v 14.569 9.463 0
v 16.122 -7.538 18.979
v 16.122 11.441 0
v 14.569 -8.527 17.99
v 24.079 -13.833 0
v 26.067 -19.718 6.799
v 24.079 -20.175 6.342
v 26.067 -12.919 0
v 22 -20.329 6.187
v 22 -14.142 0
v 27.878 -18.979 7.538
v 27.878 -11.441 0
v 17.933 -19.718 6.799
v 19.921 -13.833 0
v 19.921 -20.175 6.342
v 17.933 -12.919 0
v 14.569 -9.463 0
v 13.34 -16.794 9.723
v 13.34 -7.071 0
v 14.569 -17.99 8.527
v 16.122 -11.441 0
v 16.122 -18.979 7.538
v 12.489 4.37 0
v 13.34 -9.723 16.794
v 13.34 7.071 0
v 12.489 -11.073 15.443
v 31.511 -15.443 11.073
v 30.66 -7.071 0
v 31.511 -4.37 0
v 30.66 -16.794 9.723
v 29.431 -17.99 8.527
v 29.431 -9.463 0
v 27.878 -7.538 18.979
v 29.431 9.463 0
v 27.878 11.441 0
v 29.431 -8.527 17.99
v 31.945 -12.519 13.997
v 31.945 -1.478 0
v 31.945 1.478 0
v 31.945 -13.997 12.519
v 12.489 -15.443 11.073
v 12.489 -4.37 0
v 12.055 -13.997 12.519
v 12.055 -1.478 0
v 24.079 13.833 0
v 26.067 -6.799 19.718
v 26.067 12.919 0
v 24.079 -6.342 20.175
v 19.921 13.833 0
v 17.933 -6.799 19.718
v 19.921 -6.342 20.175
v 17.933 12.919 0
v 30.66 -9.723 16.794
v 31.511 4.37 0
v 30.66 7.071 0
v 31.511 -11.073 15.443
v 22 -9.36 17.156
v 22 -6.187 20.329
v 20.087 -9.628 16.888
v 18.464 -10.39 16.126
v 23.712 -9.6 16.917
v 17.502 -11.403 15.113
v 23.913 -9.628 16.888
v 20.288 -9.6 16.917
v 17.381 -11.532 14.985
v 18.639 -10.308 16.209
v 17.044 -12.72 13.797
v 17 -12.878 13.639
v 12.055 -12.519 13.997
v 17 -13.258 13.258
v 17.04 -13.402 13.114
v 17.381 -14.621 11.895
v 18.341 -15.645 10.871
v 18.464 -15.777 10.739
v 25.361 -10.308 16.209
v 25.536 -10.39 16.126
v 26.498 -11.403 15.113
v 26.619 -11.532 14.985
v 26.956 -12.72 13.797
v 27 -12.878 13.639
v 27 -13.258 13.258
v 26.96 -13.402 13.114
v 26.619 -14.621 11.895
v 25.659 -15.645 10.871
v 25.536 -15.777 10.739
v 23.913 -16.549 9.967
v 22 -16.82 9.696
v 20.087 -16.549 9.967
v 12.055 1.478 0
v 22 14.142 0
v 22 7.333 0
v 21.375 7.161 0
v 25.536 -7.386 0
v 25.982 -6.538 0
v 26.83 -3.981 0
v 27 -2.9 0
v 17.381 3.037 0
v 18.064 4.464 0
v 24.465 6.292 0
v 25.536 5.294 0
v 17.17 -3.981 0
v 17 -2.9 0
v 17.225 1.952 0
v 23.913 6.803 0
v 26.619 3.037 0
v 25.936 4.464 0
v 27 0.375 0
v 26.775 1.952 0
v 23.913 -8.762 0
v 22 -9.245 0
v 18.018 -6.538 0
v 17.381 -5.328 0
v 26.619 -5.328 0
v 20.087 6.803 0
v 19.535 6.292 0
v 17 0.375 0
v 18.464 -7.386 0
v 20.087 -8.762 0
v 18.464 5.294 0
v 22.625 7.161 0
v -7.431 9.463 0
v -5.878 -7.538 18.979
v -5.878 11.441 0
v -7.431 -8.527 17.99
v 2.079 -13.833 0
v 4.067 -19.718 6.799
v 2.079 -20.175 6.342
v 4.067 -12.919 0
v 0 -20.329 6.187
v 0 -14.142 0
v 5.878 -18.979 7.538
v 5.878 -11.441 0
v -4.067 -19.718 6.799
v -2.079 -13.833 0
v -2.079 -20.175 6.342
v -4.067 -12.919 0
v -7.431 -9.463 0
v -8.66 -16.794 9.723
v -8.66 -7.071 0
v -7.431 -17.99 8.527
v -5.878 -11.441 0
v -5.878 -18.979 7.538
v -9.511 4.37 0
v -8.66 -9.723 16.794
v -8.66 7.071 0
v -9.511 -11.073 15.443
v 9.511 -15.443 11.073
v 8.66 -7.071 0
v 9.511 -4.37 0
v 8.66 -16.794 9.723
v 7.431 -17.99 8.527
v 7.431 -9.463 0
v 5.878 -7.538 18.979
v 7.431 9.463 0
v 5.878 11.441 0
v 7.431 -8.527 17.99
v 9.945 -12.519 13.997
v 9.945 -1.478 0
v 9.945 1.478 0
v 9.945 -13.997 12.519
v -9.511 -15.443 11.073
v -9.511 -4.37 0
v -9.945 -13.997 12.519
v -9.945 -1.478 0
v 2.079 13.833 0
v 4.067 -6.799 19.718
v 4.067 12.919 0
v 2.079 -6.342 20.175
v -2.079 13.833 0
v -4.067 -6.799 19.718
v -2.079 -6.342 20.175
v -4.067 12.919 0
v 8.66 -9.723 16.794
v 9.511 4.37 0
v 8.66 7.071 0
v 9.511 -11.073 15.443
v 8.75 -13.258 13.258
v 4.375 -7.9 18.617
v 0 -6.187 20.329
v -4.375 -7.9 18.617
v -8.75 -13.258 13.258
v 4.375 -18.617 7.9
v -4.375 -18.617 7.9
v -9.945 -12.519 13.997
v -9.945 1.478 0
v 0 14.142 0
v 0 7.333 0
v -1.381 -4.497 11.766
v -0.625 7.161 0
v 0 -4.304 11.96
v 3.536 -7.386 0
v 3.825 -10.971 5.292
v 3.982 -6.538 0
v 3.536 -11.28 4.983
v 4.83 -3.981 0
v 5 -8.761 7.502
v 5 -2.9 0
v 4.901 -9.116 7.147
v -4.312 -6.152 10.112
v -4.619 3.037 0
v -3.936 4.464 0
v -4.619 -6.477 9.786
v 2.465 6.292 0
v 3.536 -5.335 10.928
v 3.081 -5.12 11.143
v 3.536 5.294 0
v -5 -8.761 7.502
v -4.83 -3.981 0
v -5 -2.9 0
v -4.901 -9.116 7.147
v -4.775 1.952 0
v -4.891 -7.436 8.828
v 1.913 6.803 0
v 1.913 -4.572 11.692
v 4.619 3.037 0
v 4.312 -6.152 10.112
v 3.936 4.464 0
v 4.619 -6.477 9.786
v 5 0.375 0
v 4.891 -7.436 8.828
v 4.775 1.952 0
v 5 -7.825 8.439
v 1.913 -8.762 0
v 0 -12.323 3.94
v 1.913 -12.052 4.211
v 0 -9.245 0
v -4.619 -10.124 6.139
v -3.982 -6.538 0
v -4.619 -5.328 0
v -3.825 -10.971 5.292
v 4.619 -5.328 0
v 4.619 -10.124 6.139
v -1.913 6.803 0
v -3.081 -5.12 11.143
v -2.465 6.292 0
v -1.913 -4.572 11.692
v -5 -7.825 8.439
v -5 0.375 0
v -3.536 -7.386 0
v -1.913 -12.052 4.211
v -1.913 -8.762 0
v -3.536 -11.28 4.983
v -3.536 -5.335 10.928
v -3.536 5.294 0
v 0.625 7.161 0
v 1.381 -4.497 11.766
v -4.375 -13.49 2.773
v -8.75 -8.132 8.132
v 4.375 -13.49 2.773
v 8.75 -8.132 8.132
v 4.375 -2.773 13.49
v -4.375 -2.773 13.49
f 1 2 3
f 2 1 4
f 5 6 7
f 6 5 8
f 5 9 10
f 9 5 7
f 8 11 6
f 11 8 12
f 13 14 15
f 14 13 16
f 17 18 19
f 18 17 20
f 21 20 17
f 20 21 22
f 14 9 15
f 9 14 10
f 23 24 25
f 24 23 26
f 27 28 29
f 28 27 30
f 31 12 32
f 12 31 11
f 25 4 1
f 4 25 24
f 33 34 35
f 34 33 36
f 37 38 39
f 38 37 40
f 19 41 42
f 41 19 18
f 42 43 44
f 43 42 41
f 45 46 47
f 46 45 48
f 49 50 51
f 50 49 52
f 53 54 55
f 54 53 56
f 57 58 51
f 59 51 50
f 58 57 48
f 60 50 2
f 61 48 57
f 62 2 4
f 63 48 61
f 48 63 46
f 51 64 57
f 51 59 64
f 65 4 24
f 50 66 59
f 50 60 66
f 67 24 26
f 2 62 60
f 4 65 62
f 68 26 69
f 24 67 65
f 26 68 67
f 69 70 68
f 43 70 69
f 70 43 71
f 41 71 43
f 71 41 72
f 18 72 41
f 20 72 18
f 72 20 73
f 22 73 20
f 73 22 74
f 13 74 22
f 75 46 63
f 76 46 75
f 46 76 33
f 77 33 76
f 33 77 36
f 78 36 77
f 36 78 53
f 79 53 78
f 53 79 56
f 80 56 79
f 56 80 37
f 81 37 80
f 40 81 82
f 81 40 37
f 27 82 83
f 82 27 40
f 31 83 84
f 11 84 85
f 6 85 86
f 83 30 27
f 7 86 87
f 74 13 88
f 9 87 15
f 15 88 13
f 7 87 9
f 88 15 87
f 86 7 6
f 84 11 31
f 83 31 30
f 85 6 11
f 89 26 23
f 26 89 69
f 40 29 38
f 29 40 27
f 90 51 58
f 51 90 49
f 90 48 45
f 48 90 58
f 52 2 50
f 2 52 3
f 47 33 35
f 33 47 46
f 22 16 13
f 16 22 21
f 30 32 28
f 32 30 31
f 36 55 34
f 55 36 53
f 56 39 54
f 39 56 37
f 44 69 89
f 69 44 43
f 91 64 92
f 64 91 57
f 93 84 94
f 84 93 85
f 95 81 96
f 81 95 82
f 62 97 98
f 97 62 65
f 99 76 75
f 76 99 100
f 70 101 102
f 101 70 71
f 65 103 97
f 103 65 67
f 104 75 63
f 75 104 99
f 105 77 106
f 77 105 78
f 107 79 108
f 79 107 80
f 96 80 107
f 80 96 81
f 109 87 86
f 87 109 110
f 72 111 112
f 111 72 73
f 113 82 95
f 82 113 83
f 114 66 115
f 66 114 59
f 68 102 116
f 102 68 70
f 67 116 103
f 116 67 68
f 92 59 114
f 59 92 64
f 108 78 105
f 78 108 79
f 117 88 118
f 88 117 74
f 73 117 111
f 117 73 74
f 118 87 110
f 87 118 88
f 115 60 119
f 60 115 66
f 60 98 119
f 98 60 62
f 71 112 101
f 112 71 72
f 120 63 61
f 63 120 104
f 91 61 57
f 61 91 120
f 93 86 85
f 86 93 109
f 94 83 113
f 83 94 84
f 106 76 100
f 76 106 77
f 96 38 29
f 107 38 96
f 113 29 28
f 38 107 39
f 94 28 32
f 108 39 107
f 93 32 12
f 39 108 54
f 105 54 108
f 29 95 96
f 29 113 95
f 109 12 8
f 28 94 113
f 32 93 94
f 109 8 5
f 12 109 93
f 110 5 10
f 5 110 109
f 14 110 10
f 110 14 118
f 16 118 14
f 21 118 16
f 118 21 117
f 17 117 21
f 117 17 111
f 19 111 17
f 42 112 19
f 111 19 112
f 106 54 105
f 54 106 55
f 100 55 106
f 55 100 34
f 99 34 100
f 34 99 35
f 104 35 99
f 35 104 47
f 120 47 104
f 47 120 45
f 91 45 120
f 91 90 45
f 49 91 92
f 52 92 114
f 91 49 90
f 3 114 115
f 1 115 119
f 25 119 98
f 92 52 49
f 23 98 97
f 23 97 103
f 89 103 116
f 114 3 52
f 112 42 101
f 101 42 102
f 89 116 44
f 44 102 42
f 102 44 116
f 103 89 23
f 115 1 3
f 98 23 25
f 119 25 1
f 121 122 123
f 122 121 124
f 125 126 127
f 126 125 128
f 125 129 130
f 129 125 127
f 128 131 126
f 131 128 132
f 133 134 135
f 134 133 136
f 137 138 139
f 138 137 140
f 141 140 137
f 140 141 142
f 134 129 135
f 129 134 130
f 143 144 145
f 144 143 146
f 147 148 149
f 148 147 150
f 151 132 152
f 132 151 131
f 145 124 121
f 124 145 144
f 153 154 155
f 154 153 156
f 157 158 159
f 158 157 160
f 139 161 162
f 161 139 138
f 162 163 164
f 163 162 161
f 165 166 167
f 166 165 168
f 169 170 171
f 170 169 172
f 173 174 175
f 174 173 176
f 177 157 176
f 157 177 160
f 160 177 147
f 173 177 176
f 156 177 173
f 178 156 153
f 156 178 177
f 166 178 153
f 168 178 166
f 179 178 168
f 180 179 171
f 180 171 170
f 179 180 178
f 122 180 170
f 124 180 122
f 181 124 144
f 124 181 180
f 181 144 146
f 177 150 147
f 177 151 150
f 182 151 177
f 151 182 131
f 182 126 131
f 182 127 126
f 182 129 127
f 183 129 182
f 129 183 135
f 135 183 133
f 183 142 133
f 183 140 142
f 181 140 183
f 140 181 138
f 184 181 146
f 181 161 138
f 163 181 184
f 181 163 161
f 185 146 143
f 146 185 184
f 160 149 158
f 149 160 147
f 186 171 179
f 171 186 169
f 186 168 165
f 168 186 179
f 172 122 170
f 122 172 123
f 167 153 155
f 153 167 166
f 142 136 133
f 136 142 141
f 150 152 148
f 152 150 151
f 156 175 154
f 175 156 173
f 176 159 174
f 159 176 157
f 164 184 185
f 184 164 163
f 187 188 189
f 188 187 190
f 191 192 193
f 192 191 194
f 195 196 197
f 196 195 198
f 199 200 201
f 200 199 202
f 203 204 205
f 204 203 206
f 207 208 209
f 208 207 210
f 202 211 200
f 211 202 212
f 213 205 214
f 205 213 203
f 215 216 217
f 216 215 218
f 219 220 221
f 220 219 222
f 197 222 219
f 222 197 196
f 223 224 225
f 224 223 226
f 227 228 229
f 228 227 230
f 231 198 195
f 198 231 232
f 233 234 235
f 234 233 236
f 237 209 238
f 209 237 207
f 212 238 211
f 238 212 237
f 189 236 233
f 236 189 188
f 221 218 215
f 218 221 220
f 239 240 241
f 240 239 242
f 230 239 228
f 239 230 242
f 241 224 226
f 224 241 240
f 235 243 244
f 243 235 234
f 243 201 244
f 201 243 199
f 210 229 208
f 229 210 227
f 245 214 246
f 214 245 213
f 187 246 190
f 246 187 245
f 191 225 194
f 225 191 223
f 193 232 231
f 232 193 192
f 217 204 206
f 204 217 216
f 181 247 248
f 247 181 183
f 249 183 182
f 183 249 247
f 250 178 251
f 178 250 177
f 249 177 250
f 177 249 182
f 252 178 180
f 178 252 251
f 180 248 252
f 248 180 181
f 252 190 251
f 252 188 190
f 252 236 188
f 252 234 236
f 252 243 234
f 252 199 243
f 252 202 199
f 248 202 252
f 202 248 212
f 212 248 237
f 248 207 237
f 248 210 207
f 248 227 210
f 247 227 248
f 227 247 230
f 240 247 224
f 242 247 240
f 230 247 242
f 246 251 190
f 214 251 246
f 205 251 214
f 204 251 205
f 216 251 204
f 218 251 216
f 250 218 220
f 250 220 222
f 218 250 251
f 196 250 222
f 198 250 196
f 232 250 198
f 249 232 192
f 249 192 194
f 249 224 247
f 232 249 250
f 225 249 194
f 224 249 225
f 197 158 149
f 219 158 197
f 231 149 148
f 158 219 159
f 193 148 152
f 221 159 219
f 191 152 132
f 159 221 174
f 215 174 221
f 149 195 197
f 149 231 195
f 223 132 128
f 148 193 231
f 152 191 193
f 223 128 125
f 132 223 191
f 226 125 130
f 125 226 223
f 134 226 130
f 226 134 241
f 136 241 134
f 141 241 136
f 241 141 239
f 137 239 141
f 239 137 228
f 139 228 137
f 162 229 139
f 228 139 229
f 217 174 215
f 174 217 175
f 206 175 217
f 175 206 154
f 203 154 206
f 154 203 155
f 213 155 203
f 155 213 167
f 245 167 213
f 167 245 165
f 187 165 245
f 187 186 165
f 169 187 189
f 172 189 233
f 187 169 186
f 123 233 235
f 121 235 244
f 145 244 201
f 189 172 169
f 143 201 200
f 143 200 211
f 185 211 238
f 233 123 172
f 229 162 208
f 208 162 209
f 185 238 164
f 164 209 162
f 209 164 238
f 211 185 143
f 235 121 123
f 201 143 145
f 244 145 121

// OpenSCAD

//Diameter of the wedge, make this slightly smaller than the inner diameter of your tube.
outer_diameter = 20; 

//Diameter of the bolt hole, make this slightly larger than the diameter of your bolt.
core_diameter = 10; 

//Diameter of the nut socket, make this slightly larger than the nut measured point to point (not the flats). 
nut_diameter = 17.5;

/* [Hidden] */

flare_angle = 7;
nut_seat = 1.5;

outer_radius = outer_diameter / 2;
core_radius = core_diameter / 2;
nut_radius = nut_diameter / 2;
center_height = outer_radius + nut_diameter / 2;
double_height = center_height * 2;

module wedge(has_nut) {

	module flared_cyl() {
	
		module cyl(height) {
			translate([0, 0, -center_height]) {
				cylinder(r = core_radius, h = height, center = true);
			}
		}

		translate([0, 0, center_height]) {
			hull() {
				cyl(double_height);
				rotate([0, -flare_angle, 0]) {
					cyl(double_height + outer_radius);
				}
			}
		}
	}

	intersection() {
		translate([-double_height, -outer_radius, 0]) {
			cube([2 * double_height, outer_diameter, double_height]);
		}
		rotate([0, 45, 0]) {
			difference() {
				cylinder(r = outer_radius, h = double_height, center = true);
				flared_cyl();

				if (has_nut) {
					translate([0, 0, outer_radius + nut_seat]) {
						nut();
					}
				}

			}
		}
	}
}

module nut() {
	rotate([0, 0, 30]) {
		cylinder(r = nut_radius, h = center_height, $fn = 6, center = false);
	}
}

module main() {
	rotate([0, 0, -90]) {
		translate([0, outer_diameter + 2, 0]) {
			wedge(false);
		}

		wedge(true);
	}
}

if (core_diameter >= outer_diameter) {
	echo("core diameter must be less than outer diameter.");
} else if (nut_diameter >= outer_diameter) {
	echo("nut diameter must be less than outer diameter.");
} else if (core_diameter >= nut_diameter) {
	echo("core diameter must be less than nut diameter.");
} else {
	main();
}

